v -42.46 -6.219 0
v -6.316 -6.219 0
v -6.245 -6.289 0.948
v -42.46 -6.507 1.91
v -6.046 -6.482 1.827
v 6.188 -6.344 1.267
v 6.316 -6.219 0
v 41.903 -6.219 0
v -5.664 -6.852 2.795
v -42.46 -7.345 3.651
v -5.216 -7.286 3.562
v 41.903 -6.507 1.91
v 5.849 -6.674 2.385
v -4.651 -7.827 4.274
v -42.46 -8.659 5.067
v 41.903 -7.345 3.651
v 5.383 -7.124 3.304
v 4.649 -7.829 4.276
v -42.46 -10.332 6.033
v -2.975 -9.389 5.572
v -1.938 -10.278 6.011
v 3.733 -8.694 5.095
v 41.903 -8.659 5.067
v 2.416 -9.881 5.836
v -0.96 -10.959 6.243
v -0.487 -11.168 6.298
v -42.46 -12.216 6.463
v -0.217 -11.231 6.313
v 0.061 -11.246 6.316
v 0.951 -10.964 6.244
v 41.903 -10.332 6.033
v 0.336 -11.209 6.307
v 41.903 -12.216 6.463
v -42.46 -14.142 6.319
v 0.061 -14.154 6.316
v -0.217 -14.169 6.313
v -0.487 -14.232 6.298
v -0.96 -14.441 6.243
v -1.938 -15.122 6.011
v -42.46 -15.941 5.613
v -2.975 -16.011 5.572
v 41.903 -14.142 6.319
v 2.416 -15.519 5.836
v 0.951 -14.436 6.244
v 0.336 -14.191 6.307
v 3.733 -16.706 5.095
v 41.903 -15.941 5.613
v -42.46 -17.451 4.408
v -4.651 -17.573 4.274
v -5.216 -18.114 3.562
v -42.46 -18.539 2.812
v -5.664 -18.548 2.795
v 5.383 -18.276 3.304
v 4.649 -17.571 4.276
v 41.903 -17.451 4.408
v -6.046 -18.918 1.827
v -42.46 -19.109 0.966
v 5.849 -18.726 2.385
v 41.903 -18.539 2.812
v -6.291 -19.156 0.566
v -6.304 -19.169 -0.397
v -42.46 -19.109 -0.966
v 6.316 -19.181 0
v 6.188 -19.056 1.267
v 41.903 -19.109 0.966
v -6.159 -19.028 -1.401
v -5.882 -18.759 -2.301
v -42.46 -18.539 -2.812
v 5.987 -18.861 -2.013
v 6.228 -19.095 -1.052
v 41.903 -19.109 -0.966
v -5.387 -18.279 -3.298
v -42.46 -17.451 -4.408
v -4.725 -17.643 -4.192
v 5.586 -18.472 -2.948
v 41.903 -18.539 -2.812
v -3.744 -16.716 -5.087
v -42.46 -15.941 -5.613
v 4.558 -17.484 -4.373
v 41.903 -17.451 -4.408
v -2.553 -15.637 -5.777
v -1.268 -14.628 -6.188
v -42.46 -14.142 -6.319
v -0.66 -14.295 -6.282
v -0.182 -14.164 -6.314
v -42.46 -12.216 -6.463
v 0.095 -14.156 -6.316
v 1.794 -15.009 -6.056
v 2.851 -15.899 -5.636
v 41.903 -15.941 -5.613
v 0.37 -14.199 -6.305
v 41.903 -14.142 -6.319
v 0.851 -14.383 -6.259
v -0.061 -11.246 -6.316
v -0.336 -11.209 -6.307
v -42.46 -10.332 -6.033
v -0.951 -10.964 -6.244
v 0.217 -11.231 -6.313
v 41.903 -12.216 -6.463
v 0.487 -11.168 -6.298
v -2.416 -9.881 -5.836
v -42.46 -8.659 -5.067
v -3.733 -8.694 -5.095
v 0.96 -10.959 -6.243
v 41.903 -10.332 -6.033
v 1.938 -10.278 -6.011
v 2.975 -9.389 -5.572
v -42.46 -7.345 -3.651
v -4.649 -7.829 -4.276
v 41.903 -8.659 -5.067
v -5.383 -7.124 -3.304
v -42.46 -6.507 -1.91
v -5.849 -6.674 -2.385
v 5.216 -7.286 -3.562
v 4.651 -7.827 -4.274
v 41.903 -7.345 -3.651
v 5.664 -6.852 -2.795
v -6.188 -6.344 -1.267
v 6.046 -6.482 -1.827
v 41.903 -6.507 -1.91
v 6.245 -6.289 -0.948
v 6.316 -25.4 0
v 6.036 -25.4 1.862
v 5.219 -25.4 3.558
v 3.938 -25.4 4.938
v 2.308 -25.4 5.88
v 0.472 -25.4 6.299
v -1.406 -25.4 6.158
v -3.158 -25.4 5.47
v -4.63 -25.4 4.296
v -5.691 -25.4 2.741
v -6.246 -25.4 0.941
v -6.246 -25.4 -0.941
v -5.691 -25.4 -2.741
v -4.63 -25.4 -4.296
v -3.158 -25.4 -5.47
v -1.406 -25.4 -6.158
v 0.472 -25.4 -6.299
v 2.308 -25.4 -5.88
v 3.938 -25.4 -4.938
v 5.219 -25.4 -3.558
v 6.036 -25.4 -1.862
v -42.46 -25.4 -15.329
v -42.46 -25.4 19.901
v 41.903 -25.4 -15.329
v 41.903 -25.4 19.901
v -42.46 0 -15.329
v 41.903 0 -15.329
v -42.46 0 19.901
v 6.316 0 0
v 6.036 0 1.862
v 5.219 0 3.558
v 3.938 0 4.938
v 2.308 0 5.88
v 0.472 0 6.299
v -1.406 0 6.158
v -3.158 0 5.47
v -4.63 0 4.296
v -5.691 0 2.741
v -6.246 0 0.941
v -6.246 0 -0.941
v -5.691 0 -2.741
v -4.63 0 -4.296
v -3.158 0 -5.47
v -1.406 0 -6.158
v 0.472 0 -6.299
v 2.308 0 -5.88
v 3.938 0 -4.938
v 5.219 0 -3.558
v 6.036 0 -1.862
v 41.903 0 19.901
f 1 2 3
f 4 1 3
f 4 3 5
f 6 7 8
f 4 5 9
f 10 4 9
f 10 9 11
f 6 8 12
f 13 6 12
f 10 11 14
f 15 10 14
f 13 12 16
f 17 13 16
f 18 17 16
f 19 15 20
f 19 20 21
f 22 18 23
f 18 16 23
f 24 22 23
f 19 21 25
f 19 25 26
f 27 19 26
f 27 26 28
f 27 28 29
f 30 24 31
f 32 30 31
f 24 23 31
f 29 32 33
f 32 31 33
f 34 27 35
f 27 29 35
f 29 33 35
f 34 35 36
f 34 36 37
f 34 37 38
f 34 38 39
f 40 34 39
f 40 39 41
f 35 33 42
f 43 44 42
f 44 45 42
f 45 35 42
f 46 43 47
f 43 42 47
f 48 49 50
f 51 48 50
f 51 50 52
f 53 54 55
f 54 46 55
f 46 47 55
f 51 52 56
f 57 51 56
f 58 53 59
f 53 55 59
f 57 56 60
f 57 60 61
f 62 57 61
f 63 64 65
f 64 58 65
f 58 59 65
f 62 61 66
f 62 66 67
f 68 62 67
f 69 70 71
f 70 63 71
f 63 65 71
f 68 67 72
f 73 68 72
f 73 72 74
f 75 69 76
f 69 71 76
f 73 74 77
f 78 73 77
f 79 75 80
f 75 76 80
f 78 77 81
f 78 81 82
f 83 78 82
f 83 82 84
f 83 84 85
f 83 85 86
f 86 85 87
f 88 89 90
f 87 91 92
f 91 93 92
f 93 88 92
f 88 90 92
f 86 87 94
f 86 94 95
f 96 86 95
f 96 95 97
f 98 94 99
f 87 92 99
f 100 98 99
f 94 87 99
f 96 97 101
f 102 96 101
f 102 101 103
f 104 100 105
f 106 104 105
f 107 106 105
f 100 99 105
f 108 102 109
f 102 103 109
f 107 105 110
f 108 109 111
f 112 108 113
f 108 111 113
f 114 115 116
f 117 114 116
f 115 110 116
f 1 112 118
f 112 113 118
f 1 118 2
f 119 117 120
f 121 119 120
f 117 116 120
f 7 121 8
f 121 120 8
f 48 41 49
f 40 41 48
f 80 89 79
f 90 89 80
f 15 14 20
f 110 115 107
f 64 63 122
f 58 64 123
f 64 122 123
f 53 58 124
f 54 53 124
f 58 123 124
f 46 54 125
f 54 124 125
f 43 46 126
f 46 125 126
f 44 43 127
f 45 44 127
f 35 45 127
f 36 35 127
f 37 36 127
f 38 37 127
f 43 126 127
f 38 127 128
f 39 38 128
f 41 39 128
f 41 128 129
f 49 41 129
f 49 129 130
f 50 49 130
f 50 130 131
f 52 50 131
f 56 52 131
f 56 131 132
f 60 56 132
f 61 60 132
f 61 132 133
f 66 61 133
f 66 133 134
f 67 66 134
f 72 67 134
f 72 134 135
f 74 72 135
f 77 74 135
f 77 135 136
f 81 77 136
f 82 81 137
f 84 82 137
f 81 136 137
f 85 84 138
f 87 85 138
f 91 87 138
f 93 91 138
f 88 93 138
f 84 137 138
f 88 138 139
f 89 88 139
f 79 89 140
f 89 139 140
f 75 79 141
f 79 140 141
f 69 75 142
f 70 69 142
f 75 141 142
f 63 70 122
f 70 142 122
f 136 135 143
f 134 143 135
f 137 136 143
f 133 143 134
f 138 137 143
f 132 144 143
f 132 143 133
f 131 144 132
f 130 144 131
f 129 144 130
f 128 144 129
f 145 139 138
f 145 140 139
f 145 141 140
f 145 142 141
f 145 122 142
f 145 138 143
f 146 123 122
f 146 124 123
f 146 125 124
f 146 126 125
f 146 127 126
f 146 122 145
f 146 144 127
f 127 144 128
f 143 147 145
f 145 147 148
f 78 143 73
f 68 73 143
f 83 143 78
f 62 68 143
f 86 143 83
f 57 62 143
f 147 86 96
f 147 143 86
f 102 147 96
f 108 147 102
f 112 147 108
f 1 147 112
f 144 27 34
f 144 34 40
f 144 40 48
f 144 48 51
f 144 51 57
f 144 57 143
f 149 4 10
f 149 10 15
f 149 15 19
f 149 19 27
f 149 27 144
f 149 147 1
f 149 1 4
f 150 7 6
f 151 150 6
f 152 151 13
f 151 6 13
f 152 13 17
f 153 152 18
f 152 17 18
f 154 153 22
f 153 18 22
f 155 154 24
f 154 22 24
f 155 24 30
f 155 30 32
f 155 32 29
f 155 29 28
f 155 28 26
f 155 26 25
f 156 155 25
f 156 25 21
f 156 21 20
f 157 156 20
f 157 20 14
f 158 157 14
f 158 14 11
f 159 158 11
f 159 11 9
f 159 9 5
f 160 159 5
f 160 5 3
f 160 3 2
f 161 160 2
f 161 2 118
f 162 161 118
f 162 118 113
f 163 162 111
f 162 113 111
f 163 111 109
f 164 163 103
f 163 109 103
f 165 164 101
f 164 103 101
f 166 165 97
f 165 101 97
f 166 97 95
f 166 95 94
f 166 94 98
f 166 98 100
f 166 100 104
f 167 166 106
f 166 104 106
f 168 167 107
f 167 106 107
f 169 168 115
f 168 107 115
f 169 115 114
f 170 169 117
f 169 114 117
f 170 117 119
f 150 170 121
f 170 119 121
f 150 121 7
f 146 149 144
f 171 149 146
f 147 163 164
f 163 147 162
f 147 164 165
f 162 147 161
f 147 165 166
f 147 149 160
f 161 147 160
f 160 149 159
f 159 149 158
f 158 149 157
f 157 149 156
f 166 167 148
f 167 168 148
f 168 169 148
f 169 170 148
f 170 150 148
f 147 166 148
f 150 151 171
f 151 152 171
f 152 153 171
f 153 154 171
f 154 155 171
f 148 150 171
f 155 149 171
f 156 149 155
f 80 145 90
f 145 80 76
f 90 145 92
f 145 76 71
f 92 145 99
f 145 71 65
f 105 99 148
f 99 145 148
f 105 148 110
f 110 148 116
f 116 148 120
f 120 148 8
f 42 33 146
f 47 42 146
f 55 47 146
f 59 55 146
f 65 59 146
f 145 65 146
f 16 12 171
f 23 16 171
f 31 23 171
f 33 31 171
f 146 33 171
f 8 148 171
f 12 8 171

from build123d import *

# Parameters (mm, degrees)
F0_W     = 84.3636319041
F0_H     = 35.2298701182
F1_DEPTH = 25.4
F2_R     = 6.3162901038
F3_DEPTH = 25.401
F4_R     = 6.4811389114
F5_DEPTH = 84.3646319041


with BuildPart() as f1:
    # F0 (on Front) → F1 (new body)
    with BuildSketch(Plane.XZ):
        with Locations((-0.2784244716, 2.2862604819)):
            Rectangle(F0_W, F0_H)
    extrude(amount=F1_DEPTH)

    # F2 (on face) → F3 (cut, through all)
    with BuildSketch(Plane.XZ.offset(25.4)):
        Circle(F2_R)
    extrude(amount=-F3_DEPTH, mode=Mode.SUBTRACT)

    # F4 (on face) → F5 (cut, through all)
    with BuildSketch(Plane.YZ.offset(41.9033914804)):
        with Locations((-12.7, 0)):
            Circle(F4_R)
    extrude(amount=-F5_DEPTH, mode=Mode.SUBTRACT)


solid = f1.part
